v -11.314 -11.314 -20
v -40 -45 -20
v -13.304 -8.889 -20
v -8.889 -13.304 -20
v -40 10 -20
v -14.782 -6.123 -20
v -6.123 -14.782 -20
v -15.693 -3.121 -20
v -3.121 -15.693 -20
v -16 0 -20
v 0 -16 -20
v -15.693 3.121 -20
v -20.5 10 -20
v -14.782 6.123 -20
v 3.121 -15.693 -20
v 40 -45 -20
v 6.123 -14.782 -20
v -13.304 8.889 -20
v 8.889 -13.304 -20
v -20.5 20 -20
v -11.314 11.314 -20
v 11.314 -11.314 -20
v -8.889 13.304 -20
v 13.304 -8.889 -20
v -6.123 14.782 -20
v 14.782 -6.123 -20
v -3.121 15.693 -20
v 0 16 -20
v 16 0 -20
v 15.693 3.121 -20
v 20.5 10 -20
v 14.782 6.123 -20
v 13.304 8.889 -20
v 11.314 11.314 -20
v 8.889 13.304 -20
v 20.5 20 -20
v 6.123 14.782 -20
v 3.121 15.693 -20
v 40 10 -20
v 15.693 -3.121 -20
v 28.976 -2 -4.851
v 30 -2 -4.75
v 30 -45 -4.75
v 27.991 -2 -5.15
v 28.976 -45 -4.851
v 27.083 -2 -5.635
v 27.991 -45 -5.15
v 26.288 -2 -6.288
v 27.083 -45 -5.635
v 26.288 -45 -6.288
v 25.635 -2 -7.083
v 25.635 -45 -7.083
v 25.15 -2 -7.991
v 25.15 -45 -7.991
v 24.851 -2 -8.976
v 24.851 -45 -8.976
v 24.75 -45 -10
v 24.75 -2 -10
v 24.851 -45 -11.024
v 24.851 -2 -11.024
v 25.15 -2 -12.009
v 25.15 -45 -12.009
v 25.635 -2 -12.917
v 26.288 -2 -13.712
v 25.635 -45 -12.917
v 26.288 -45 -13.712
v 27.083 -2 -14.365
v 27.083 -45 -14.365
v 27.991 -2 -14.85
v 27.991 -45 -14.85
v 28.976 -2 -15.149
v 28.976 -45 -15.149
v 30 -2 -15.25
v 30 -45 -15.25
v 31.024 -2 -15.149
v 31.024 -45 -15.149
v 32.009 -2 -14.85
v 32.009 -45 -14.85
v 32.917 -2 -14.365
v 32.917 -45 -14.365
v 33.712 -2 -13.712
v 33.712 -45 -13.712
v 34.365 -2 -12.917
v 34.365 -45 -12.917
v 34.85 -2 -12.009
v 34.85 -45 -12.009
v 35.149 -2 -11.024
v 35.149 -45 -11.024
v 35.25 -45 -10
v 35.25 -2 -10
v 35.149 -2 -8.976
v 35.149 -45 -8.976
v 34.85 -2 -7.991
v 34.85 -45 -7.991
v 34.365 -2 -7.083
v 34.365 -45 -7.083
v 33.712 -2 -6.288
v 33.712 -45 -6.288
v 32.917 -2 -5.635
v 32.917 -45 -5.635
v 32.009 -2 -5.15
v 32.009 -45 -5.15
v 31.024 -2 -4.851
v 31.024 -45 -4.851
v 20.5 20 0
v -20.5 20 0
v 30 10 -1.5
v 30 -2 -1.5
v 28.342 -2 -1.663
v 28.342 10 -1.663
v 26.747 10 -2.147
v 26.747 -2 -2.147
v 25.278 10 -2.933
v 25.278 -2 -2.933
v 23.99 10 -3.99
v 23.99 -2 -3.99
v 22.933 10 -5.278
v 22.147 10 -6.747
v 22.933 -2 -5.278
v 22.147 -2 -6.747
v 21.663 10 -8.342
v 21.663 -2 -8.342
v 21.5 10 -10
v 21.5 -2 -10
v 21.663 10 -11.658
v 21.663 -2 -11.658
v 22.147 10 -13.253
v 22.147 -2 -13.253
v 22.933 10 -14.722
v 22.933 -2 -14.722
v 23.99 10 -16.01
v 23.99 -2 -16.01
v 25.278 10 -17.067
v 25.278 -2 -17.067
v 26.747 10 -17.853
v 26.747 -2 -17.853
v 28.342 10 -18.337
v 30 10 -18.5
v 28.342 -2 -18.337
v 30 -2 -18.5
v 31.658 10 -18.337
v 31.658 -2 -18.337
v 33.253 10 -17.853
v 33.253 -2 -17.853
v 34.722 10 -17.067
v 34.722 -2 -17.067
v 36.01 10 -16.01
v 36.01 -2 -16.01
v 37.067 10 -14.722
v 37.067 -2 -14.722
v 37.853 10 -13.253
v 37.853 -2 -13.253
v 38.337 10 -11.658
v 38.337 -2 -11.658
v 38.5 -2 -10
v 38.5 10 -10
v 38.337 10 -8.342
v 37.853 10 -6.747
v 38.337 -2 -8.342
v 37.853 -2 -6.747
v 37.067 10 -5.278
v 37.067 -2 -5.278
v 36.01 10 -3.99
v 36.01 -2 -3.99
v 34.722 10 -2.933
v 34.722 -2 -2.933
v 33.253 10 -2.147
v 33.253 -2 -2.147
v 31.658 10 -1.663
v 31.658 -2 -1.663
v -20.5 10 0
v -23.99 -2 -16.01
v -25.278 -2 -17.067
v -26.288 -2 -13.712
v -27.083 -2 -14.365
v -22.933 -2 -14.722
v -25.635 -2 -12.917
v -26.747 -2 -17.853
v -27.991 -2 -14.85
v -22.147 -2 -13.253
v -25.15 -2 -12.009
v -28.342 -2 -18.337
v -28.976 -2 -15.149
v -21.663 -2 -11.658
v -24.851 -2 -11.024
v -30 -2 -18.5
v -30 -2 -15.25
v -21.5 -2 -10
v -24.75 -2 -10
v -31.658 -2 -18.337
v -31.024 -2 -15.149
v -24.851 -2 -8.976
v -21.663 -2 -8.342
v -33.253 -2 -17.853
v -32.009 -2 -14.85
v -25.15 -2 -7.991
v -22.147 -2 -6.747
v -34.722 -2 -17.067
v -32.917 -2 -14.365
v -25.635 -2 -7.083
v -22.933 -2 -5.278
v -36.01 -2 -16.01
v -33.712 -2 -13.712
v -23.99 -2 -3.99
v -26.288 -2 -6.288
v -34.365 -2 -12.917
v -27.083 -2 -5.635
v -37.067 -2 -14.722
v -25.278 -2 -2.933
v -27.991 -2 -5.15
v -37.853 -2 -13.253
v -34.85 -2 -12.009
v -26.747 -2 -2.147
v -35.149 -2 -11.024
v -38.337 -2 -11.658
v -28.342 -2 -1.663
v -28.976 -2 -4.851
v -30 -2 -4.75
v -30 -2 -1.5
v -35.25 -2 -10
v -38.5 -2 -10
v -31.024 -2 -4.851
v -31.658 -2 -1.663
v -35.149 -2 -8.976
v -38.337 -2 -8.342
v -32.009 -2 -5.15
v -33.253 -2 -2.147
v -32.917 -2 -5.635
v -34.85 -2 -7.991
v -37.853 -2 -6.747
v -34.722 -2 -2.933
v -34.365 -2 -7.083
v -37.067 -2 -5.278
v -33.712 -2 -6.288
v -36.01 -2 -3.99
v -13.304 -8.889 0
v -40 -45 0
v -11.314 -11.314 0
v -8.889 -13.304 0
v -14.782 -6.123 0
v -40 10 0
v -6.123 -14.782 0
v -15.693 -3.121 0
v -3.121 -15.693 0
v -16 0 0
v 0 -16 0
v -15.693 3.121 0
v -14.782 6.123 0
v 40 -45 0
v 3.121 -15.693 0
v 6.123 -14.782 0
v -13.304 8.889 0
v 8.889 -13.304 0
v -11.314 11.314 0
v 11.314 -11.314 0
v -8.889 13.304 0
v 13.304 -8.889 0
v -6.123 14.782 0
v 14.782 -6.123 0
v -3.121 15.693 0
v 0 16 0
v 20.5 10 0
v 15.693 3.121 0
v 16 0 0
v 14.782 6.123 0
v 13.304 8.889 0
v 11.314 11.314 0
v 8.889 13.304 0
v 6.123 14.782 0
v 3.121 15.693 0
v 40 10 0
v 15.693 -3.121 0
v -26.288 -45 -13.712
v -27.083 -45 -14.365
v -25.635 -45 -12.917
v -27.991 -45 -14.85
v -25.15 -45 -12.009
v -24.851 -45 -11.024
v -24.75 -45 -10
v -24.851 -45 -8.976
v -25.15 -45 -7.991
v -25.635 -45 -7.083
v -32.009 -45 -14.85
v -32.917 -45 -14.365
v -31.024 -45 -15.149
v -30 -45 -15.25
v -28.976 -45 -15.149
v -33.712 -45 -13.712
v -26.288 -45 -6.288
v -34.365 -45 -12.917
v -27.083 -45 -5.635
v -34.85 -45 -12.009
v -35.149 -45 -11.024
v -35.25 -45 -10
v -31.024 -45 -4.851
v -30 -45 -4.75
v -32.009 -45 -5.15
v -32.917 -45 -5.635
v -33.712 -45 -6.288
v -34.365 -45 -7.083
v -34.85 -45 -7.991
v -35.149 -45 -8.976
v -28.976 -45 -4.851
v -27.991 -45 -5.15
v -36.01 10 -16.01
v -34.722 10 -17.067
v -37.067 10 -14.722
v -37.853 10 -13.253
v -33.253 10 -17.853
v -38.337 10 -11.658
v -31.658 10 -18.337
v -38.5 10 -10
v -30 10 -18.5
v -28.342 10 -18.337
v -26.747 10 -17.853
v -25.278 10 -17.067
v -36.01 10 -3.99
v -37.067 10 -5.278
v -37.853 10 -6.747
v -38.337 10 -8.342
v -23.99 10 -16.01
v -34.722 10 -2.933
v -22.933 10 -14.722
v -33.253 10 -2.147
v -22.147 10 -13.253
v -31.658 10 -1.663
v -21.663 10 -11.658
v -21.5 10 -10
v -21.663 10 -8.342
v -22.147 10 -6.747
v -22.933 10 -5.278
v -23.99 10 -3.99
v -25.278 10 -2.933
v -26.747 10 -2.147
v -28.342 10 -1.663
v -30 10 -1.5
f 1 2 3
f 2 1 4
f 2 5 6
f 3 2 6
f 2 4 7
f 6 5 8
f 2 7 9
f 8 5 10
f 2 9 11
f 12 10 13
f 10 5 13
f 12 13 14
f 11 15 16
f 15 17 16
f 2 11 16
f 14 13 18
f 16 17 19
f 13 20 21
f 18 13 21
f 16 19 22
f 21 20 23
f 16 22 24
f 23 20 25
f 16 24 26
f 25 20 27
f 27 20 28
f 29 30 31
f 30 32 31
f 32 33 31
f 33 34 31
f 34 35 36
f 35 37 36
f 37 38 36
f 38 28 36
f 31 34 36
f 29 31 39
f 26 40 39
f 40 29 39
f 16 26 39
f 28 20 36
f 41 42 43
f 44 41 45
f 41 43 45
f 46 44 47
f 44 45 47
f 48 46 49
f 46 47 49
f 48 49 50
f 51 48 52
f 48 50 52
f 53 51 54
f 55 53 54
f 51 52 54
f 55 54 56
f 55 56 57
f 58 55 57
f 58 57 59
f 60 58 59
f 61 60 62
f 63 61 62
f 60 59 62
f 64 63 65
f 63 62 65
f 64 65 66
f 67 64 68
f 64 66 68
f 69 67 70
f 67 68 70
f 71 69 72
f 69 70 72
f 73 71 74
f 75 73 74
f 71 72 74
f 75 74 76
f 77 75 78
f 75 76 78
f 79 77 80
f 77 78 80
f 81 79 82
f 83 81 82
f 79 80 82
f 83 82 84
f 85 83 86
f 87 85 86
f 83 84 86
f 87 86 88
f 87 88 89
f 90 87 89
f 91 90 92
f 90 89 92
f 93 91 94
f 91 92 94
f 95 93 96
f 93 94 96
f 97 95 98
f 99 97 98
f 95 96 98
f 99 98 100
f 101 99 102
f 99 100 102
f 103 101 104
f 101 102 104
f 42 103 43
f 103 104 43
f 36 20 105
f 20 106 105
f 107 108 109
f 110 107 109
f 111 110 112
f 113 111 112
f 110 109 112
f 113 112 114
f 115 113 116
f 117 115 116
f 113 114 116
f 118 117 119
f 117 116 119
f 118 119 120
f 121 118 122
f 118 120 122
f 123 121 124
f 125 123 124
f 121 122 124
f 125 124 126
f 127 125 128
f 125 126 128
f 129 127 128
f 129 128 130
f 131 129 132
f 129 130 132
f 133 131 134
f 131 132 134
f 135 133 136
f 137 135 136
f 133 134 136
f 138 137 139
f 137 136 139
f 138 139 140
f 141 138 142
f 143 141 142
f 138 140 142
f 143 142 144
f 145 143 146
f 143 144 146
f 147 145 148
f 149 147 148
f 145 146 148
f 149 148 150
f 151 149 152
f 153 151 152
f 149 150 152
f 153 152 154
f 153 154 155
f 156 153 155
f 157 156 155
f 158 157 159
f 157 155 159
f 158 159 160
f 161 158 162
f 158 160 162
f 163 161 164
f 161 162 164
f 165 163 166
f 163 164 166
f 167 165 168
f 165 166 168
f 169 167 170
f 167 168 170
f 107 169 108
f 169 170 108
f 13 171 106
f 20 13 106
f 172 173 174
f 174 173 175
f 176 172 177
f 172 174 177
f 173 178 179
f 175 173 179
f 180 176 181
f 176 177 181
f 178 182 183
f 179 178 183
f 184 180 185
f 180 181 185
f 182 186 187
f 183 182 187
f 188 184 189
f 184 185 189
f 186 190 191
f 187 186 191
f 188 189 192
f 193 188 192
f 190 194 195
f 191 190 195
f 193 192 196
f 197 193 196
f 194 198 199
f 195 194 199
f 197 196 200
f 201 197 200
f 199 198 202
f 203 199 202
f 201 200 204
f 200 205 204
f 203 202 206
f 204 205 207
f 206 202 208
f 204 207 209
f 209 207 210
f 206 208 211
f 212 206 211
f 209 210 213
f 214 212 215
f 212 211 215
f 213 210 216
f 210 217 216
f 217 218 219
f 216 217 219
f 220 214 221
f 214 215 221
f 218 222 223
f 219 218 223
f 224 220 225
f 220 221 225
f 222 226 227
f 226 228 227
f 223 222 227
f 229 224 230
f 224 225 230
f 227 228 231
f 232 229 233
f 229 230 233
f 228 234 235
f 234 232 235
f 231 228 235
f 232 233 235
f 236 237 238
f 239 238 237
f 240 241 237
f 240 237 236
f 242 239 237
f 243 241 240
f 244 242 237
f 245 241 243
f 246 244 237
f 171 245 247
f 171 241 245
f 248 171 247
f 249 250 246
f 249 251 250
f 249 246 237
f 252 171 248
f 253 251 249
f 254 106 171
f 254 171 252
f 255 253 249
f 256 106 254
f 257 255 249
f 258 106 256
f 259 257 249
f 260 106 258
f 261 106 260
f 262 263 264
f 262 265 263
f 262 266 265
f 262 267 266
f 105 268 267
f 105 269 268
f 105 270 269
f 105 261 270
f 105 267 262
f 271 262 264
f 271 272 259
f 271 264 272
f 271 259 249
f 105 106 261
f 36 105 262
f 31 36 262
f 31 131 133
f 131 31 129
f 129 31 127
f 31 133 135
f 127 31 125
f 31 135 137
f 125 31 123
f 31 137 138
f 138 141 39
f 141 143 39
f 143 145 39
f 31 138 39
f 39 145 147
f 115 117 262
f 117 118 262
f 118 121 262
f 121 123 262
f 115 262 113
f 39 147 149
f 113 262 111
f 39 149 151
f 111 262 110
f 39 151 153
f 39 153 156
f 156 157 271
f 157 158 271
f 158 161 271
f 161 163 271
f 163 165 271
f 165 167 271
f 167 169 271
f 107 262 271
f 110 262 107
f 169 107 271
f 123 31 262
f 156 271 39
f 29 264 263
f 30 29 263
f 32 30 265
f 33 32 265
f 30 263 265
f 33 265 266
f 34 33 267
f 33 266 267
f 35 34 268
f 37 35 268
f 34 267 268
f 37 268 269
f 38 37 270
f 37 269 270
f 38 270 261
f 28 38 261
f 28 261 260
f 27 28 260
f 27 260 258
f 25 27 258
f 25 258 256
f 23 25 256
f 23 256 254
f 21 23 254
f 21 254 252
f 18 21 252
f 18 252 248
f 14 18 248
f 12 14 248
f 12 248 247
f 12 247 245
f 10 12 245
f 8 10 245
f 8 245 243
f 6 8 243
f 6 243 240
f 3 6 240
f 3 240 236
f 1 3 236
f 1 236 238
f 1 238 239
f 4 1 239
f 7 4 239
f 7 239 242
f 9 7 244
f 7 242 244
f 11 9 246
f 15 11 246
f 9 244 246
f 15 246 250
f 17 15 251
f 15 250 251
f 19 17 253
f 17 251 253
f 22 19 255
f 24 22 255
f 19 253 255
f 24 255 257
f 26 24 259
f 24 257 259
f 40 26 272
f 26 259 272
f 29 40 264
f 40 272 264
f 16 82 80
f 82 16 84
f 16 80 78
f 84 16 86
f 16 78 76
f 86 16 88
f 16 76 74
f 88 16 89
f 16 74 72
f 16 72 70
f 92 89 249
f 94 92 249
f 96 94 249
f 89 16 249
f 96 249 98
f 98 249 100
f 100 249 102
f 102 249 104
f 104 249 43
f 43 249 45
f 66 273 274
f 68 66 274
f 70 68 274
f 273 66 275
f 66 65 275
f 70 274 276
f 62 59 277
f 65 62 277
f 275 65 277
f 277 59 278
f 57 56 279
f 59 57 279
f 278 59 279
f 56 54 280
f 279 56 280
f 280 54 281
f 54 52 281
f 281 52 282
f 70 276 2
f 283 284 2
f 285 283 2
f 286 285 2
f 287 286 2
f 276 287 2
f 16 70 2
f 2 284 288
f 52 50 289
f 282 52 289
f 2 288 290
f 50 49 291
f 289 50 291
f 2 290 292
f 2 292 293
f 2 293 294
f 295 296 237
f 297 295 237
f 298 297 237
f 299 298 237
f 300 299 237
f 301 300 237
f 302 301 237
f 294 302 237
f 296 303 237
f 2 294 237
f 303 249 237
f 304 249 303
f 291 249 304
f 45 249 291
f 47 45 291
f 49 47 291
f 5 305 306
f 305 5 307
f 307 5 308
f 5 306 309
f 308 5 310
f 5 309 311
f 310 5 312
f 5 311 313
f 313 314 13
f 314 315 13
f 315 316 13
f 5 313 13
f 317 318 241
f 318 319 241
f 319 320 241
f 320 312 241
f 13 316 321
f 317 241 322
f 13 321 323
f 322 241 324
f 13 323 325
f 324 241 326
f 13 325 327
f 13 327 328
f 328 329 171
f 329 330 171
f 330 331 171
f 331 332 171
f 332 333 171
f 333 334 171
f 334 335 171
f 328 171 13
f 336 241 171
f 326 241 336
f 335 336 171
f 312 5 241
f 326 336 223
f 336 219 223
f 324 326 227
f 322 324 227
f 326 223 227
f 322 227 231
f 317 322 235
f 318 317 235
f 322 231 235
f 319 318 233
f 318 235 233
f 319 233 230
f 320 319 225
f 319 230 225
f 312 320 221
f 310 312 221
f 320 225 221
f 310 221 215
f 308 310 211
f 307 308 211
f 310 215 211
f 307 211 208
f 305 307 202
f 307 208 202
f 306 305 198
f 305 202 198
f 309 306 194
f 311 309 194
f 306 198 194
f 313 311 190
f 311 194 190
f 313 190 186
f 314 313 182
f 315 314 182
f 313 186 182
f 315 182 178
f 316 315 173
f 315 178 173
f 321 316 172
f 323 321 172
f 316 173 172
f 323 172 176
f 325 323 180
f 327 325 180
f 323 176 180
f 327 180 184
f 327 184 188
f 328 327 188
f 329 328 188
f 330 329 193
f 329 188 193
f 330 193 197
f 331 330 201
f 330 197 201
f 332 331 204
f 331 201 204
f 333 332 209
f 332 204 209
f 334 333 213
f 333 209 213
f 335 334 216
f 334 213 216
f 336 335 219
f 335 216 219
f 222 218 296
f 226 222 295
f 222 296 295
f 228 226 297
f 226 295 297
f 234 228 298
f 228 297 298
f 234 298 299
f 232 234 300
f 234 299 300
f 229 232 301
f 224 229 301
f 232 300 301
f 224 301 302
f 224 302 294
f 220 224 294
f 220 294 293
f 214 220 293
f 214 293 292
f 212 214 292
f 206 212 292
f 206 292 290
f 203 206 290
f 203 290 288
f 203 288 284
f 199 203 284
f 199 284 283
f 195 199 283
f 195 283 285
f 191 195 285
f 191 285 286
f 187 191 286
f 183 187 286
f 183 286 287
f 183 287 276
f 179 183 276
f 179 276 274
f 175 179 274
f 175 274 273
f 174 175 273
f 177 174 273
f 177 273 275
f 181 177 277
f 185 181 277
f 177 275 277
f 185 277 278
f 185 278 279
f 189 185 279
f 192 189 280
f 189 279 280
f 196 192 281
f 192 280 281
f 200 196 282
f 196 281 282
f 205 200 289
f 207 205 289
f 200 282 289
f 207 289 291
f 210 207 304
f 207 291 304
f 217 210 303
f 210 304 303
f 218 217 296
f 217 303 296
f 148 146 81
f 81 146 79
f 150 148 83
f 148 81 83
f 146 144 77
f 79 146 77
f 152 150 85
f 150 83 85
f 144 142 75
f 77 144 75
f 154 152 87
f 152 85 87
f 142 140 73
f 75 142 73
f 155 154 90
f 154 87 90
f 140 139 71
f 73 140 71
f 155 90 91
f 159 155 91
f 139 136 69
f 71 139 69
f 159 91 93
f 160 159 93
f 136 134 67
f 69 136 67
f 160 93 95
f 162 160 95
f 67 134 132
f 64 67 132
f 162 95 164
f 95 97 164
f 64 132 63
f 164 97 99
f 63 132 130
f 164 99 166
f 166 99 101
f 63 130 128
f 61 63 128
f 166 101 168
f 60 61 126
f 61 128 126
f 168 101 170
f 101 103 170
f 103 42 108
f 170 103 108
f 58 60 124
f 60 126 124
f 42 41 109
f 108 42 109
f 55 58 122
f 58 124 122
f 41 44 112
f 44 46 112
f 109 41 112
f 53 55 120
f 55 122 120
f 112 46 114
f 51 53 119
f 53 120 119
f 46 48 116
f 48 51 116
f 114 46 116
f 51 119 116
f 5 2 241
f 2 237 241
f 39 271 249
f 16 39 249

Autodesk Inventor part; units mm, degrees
sketch "Sketch_1" plane through (0, 0, 0) normal (0, 0, 1) x (1, 0, 0)
  line L0 (-40, -45) -> (-40, 10)
  line L1 (-40, 10) -> (-20.5, 10)
  line L2 (-20.5, 10) -> (-20.5, 20)
  line L3 (-20.5, 20) -> (20.5, 20)
  line L4 (20.5, 20) -> (20.5, 10)
  line L5 (20.5, 10) -> (40, 10)
  line L6 (40, 10) -> (40, -45)
  line L7 (40, -45) -> (-40, -45)
  line L8 (-40, -45) -> (-40, -25)
  dimension "d24" = 55
  dimension "d25" = 19.5
  dimension "d26" = 10
  dimension "d27" = 41
  dimension "d28" = 10
  dimension "d29" = 19.5
  dimension "d30" = 55
  dimension "d31" = 20
extrude "Extrusion1" add sketch "Sketch_1" against normal blind 20
ref_plane "bf_1_XY" through (0, 0, 0) normal (0, 0, 1) x (1, 0, 0)
ref_plane "bf_1_YZ" through (0, 0, 0) normal (1, 0, 0) x (0, 1, 0)
ref_plane "bf_1_ZX" through (0, 0, 0) normal (0, 1, 0) x (0, 0, 1)
ref_plane "bf_2x_XY" through (0, 0, -10) normal (0, 0, 1) x (1, 0, 0)
ref_plane "bf_2x_YZ" through (0, 0, -10) normal (1, 0, 0) x (0, 1, 0)
ref_plane "bf_2x_ZX" through (0, 0, -10) normal (0, 1, 0) x (0, 0, 1)
sketch "Sketch6" plane through (20.5, 10, 0) normal (0, 1, 0) x (1, 0, 0)
  line L0 (-41, 0) -> (0, 0) projected
  line L1 (19.5, 0) -> (19.5, 20) projected
  line L2 (19.5, 10) -> (9.5, 10)
  line L3 (-60.5, 0) -> (-60.5, 20) projected
  line L4 (-60.5, 10) -> (-50.5, 10)
  point P0 (-20.5, 0)
  dimension "d32" = 10
  dimension "d40" = 10
hole "Hole4" at (30, 10, -10) at (-30, 10, -10) direction (0, -1, 0) diameter 10.5 end through all counterbore diameter 17 counterbore depth 12
sketch "Sketch7" plane through (0, 0, 0) normal (0, 0, 1) x (1, 0, 0)
  circle A0 centre (0, 0) radius 16
  dimension "d42" = 32
extrude "Extrusion2" cut sketch "Sketch7" against normal up to surface (20 mm away)
properties part number "BF 15 Part1"
